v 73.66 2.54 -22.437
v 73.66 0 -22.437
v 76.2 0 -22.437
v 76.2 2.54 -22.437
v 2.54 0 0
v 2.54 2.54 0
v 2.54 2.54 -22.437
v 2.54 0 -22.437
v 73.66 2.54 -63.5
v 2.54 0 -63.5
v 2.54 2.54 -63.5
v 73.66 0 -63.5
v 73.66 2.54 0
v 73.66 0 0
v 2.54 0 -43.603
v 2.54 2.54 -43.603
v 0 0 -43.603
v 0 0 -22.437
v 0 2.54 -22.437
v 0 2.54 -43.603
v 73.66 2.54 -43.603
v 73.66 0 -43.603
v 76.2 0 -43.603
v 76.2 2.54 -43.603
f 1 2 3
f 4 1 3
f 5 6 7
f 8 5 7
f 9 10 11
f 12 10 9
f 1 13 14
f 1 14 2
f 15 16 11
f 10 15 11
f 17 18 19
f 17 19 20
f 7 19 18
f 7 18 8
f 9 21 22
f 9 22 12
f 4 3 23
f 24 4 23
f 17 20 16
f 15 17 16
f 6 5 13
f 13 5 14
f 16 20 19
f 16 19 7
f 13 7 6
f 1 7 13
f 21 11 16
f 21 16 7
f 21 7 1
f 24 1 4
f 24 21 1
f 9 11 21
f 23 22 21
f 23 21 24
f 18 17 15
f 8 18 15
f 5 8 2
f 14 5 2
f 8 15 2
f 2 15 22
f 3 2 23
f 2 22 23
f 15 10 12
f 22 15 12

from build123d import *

# Parameters (mm, degrees)
SKETCH1_W           = 76.2
SKETCH1_H           = 63.5
BOSS_EXTRUDE1_DEPTH = 2.54
SKETCH2_W           = 2.54
SKETCH2_H           = 19.8966582
CUT_EXTRUDE1_DEPTH  = 3.54
SKETCH3_W           = 2.54
SKETCH3_H           = 22.4366582
SKETCH3_H_2         = 19.8966582
CUT_EXTRUDE2_DEPTH  = 3.54


with BuildPart() as part:
    # Sketch1 → Boss-Extrude1 (new body)
    with BuildSketch(Plane(origin=(0, 0, 0), x_dir=(1, 0, 0), z_dir=(0, 1, 0))):
        with Locations((38.1, 31.75)):
            Rectangle(SKETCH1_W, SKETCH1_H)
    extrude(amount=BOSS_EXTRUDE1_DEPTH)

    # Sketch2 → Cut-Extrude1 (cut, through all)
    with BuildSketch(Plane(origin=(0, 2.54, 0), x_dir=(1, 0, 0), z_dir=(0, 1, 0))):
        with Locations((1.27, 53.5516709)):
            Rectangle(SKETCH2_W, SKETCH2_H)
    extrude(amount=-CUT_EXTRUDE1_DEPTH, mode=Mode.SUBTRACT)

    # Sketch3 → Cut-Extrude2 (cut, through all)
    with BuildSketch(Plane(origin=(0, 2.54, 0), x_dir=(1, 0, 0), z_dir=(0, 1, 0))):
        with Locations((1.27, 11.2183291)):
            Rectangle(SKETCH3_W, SKETCH3_H)
        with Locations((74.93, 53.5516709)):
            Rectangle(SKETCH3_W, SKETCH3_H_2)
        with Locations((74.93, 11.2183291)):
            Rectangle(SKETCH3_W, SKETCH3_H)
    extrude(amount=-CUT_EXTRUDE2_DEPTH, mode=Mode.SUBTRACT)


solid = part.part
